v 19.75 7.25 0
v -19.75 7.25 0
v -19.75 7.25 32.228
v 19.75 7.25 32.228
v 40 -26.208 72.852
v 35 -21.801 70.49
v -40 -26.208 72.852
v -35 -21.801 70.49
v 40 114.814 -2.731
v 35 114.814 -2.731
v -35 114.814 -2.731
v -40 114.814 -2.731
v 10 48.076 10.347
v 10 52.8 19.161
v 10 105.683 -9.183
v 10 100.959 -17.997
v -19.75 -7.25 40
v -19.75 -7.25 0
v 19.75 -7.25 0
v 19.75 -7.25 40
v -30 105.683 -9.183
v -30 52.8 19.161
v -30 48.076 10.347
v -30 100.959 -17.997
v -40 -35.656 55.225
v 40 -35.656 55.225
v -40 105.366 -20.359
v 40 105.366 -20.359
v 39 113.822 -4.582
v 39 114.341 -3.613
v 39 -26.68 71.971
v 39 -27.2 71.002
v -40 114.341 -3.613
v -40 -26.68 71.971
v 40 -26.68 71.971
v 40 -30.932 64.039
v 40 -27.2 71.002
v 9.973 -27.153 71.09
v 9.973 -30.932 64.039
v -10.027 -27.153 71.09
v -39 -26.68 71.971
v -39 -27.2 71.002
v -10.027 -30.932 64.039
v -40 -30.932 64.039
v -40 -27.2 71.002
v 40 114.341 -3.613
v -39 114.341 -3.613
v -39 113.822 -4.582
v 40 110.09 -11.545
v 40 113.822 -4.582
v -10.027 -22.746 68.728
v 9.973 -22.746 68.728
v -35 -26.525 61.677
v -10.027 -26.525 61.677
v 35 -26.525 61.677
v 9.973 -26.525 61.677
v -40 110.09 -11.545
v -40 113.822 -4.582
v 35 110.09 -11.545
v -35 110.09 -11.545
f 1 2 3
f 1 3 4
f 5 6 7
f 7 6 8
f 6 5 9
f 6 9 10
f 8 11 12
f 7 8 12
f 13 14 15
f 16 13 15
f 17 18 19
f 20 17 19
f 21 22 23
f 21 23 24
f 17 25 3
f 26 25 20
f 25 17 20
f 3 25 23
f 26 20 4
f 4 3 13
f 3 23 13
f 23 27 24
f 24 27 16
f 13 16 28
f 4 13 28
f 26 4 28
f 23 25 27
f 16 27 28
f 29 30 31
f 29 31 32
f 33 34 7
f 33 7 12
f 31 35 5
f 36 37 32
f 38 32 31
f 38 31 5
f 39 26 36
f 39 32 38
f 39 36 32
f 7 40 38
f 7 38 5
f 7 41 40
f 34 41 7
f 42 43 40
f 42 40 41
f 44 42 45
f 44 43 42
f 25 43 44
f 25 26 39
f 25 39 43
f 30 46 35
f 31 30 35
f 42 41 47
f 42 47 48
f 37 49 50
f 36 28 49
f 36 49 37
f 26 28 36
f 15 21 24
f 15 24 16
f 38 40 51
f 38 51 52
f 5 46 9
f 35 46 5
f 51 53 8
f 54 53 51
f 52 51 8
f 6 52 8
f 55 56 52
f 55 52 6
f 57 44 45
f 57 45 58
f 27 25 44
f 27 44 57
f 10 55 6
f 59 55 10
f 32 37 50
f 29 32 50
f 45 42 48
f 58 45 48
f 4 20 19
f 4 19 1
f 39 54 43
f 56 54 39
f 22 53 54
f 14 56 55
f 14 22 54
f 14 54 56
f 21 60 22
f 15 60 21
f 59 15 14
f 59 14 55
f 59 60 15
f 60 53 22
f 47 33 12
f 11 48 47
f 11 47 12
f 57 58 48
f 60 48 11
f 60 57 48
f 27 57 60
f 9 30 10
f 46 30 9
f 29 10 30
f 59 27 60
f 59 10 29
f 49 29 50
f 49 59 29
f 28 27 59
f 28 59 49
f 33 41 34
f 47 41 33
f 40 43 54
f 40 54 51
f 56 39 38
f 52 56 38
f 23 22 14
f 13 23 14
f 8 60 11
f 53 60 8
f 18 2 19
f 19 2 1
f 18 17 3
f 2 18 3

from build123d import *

# Parameters (mm, degrees)
SKETCH_1_W               = 39.5
SKETCH_1_H               = 14.5
EXTRUDE_1_DEPTH          = 40
SKETCH_6_W               = 80
SKETCH_6_H               = 160
EXTRUDE_2_DEPTH          = 10
EXTRUDE_3_DEPTH          = 10
SKETCH_8_W               = 40
SKETCH_8_H               = 60
CUT_EXTRUDE_1_DEPTH      = 10
SKETCH_9_W               = 20
SKETCH_9_H               = 8
CUT_EXTRUDE_3_DEPTH      = 10
CUT_EXTRUDE_4_DEPTH      = 158.764612799
CUT_EXTRUDE_4_DEPTH_BACK = 1
CUT_EXTRUDE_5_DEPTH      = 1


with BuildPart() as part:
    # 草图1 → 凸台-拉伸1 (new body)
    with BuildSketch(Plane.XY):
        Rectangle(SKETCH_1_W, SKETCH_1_H)
    extrude(amount=EXTRUDE_1_DEPTH)

    # 草图6 → 凸台-拉伸2 (add)
    with BuildSketch(Plane(origin=(0, 15.03668382, 28.054947672), x_dir=(1, 0, 0), z_dir=(0, 0.4723983215829414, 0.8813851744643881))):
        with Locations((0, 22.485349826)):
            Rectangle(SKETCH_6_W, SKETCH_6_H)
    extrude(amount=EXTRUDE_2_DEPTH)

    # 草图7 → 凸台-拉伸3 (add)
    with BuildSketch(Plane(origin=(0, 19.760667036, 36.868799416), x_dir=(1, 0, 0), z_dir=(0, 0.4723983215829416, 0.881385174464388))):
        Polygon((-35, -52.514650174), (35, -52.514650174), (35, 102.485349826), (40, 102.485349826), (40, -57.514650174), (-40, -57.514650174), (-40, 102.485349826), (-35, 102.485349826), align=None)
    extrude(amount=EXTRUDE_3_DEPTH)

    # 草图8 → 切除-拉伸1 (cut)
    with BuildSketch(Plane(origin=(0, 19.760667036, 36.868799416), x_dir=(1, 0, 0), z_dir=(0, 0.47239832158294137, 0.8813851744643881))):
        with Locations((-10, 67.485349826)):
            Rectangle(SKETCH_8_W, SKETCH_8_H)
    extrude(amount=-CUT_EXTRUDE_1_DEPTH, mode=Mode.SUBTRACT)

    # 草图9 → 切除-拉伸3 (cut)
    with BuildSketch(Plane(origin=(0, -50.692559978, 27.169824208), x_dir=(1, 0, 0), z_dir=(0, -0.881385174464388, 0.47239832158294154))):
        with Locations((-0.027304515, 45.830519147)):
            Rectangle(SKETCH_9_W, SKETCH_9_H)
    extrude(amount=-CUT_EXTRUDE_3_DEPTH, mode=Mode.SUBTRACT)

    # 草图10 → 切除-拉伸4 (cut, two sides: drawn at the far end of the back side and taken through both)
    with BuildSketch(Plane.ZY.offset(40).offset(-CUT_EXTRUDE_4_DEPTH_BACK)):
        Polygon((235.352563611, -333.840604393), (71.001566503, -27.199946201), (-4.58216495, 113.821681713), (-3.612641258, 114.341319867), (71.971090195, -26.680308047), (236.322087302, -333.320966239), (565.024081517, -946.602282623), (564.054557825, -947.121920777), align=None)
    extrude(amount=CUT_EXTRUDE_4_DEPTH + CUT_EXTRUDE_4_DEPTH_BACK, mode=Mode.SUBTRACT)

    # 草图11 → 切除-拉伸5 (cut)
    with BuildSketch(Plane(origin=(40, 0, 0), x_dir=(0, 0, -1), z_dir=(1, 0, 0))):
        Polygon((3.612641258, 114.341319867), (-71.971090195, -26.680308047), (-71.001566503, -27.199946201), (4.58216495, 113.821681713), align=None)
    extrude(amount=-CUT_EXTRUDE_5_DEPTH, mode=Mode.SUBTRACT)


solid = part.part
